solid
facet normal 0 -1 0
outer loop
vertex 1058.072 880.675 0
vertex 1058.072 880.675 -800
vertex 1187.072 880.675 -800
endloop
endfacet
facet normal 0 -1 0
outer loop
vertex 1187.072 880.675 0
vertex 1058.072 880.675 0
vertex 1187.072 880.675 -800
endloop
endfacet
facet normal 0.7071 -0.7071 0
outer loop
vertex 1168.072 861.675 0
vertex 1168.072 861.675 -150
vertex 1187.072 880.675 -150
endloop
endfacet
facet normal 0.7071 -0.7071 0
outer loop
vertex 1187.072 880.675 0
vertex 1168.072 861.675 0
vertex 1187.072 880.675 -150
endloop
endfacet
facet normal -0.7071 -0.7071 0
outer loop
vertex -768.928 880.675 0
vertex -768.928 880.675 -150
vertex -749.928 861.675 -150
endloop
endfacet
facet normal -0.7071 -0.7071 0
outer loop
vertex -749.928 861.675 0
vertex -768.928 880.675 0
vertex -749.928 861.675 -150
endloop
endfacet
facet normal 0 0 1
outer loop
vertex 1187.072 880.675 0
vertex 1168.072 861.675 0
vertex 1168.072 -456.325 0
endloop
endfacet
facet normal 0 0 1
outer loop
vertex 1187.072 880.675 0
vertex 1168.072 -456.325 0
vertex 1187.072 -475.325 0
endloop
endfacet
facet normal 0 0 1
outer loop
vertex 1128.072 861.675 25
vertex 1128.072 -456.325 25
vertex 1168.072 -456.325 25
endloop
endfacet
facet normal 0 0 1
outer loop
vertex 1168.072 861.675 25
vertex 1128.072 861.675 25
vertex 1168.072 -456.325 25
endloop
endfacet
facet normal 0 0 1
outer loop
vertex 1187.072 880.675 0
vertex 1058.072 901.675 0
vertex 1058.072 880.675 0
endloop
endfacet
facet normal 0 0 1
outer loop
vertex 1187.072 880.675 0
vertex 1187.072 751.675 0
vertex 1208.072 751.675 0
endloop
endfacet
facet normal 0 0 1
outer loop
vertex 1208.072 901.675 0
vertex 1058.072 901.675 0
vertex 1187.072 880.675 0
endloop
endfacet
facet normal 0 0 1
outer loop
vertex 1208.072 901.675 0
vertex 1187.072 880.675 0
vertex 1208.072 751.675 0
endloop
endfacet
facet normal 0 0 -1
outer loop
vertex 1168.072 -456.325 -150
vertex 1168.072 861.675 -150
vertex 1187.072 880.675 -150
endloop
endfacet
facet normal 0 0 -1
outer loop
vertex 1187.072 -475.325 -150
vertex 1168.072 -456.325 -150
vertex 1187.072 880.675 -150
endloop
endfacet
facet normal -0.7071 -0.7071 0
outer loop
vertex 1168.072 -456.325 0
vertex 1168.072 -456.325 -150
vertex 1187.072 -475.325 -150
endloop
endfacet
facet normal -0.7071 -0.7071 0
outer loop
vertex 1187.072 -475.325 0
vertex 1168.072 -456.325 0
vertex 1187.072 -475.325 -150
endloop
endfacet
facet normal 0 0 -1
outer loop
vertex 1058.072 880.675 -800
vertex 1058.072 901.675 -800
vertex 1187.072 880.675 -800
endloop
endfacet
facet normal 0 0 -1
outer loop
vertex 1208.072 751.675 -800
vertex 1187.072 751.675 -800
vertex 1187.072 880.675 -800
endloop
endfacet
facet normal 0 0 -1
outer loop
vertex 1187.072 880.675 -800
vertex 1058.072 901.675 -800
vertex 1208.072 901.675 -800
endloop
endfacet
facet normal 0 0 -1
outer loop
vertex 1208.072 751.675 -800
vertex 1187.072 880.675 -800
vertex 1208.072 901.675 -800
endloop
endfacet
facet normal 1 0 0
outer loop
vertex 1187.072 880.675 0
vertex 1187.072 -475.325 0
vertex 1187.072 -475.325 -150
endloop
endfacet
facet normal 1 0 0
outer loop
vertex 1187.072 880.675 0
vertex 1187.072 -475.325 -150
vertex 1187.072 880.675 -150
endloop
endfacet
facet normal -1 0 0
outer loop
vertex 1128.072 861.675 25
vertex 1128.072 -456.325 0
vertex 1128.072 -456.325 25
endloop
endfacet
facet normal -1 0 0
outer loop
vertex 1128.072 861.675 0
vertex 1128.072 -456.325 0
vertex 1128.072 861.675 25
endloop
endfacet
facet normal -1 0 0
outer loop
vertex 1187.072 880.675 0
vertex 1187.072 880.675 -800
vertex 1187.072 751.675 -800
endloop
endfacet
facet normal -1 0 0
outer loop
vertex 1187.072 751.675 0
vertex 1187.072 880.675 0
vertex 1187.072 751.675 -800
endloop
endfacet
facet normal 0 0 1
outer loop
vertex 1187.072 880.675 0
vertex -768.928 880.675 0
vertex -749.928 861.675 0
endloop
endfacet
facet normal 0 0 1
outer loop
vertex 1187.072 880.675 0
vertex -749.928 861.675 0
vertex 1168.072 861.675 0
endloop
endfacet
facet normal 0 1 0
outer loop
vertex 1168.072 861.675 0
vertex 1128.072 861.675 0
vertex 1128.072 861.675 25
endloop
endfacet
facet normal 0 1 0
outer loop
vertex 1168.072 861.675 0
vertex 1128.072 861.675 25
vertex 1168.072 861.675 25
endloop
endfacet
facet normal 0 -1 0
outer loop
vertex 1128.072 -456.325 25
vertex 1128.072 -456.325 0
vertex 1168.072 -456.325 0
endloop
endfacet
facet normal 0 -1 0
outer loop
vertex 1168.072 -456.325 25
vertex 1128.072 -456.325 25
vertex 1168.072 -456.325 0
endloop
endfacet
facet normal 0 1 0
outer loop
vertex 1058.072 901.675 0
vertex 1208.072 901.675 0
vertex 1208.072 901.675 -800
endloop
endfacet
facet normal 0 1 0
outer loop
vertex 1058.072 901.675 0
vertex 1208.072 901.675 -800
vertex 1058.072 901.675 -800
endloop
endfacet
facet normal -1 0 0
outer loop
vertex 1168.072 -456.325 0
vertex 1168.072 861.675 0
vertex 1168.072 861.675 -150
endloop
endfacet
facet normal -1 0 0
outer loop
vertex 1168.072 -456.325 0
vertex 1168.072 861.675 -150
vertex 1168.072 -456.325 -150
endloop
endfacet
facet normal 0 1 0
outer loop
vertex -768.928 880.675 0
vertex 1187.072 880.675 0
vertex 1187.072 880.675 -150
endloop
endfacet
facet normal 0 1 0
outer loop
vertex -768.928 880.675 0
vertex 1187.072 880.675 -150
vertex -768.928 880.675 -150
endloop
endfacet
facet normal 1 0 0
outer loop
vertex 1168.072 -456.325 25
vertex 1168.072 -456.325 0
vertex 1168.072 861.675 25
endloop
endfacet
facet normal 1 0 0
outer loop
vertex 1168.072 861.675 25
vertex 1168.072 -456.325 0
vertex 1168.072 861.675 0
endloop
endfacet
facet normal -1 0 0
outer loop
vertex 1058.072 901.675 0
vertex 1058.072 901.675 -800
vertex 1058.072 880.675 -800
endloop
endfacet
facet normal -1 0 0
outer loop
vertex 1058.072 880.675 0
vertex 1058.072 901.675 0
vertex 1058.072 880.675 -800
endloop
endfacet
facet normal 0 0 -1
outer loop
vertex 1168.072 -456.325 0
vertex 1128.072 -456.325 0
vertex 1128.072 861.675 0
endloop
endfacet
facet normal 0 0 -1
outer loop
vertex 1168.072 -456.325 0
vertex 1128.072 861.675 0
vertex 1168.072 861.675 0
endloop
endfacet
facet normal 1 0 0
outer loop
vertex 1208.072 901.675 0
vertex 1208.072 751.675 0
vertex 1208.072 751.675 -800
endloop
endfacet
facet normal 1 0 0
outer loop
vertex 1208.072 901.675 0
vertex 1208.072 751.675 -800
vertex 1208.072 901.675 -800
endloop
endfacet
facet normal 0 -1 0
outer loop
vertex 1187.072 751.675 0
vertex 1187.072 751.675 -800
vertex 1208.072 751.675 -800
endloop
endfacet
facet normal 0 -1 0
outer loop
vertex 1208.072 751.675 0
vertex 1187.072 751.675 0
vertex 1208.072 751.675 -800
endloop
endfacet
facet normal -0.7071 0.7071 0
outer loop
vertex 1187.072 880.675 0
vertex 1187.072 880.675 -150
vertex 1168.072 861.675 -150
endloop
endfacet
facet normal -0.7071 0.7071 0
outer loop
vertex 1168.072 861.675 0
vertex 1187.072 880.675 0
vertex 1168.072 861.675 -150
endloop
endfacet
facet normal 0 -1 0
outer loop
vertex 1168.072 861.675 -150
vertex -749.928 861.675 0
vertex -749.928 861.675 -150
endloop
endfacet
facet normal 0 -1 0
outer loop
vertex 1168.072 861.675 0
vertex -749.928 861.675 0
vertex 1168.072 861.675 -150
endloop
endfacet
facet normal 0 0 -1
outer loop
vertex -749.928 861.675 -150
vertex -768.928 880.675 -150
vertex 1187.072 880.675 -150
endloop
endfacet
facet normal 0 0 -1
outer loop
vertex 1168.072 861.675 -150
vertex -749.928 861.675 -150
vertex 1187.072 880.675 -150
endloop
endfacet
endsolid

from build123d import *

# Parameters (mm, degrees)
F1_DEPTH = 150
F2_DEPTH = 150
F3_DEPTH = 800
F0_W     = 40
F0_H     = 1318
F4_DEPTH = 25


with BuildPart() as f1:
    # F0 (on Top) → F1 (new body)
    with BuildSketch(Plane.XY):
        Polygon((1187.072175, 751.675022), (1187.072175, 880.675022), (1168.072175, 861.675022), (1168.072175, -456.324978), (1187.072175, -475.324978), align=None)
    extrude(amount=-F1_DEPTH)


with BuildPart() as f2:
    # F0 (on Top) → F2 (new body)
    with BuildSketch(Plane.XY):
        Polygon((1058.072175, 880.675022), (-768.927825, 880.675022), (-749.927825, 861.675022), (1128.072175, 861.675022), (1168.072175, 861.675022), (1187.072175, 880.675022), align=None)
    extrude(amount=-F2_DEPTH)


with BuildPart() as f3:
    # F0 (on Top) → F3 (new body)
    with BuildSketch(Plane.XY):
        Polygon((1058.072175, 901.675022), (1058.072175, 880.675022), (1187.072175, 880.675022), (1208.072175, 901.675022), align=None)
        Polygon((1208.072175, 901.675022), (1187.072175, 880.675022), (1187.072175, 751.675022), (1208.072175, 751.675022), align=None)
    extrude(amount=-F3_DEPTH)


with BuildPart() as f4:
    # F0 (on Top) → F4 (new body)
    with BuildSketch(Plane.XY):
        with Locations((1148.072175, 202.675022)):
            Rectangle(F0_W, F0_H)
    extrude(amount=F4_DEPTH)


solid = Compound([f1.part, f2.part, f3.part, f4.part])
